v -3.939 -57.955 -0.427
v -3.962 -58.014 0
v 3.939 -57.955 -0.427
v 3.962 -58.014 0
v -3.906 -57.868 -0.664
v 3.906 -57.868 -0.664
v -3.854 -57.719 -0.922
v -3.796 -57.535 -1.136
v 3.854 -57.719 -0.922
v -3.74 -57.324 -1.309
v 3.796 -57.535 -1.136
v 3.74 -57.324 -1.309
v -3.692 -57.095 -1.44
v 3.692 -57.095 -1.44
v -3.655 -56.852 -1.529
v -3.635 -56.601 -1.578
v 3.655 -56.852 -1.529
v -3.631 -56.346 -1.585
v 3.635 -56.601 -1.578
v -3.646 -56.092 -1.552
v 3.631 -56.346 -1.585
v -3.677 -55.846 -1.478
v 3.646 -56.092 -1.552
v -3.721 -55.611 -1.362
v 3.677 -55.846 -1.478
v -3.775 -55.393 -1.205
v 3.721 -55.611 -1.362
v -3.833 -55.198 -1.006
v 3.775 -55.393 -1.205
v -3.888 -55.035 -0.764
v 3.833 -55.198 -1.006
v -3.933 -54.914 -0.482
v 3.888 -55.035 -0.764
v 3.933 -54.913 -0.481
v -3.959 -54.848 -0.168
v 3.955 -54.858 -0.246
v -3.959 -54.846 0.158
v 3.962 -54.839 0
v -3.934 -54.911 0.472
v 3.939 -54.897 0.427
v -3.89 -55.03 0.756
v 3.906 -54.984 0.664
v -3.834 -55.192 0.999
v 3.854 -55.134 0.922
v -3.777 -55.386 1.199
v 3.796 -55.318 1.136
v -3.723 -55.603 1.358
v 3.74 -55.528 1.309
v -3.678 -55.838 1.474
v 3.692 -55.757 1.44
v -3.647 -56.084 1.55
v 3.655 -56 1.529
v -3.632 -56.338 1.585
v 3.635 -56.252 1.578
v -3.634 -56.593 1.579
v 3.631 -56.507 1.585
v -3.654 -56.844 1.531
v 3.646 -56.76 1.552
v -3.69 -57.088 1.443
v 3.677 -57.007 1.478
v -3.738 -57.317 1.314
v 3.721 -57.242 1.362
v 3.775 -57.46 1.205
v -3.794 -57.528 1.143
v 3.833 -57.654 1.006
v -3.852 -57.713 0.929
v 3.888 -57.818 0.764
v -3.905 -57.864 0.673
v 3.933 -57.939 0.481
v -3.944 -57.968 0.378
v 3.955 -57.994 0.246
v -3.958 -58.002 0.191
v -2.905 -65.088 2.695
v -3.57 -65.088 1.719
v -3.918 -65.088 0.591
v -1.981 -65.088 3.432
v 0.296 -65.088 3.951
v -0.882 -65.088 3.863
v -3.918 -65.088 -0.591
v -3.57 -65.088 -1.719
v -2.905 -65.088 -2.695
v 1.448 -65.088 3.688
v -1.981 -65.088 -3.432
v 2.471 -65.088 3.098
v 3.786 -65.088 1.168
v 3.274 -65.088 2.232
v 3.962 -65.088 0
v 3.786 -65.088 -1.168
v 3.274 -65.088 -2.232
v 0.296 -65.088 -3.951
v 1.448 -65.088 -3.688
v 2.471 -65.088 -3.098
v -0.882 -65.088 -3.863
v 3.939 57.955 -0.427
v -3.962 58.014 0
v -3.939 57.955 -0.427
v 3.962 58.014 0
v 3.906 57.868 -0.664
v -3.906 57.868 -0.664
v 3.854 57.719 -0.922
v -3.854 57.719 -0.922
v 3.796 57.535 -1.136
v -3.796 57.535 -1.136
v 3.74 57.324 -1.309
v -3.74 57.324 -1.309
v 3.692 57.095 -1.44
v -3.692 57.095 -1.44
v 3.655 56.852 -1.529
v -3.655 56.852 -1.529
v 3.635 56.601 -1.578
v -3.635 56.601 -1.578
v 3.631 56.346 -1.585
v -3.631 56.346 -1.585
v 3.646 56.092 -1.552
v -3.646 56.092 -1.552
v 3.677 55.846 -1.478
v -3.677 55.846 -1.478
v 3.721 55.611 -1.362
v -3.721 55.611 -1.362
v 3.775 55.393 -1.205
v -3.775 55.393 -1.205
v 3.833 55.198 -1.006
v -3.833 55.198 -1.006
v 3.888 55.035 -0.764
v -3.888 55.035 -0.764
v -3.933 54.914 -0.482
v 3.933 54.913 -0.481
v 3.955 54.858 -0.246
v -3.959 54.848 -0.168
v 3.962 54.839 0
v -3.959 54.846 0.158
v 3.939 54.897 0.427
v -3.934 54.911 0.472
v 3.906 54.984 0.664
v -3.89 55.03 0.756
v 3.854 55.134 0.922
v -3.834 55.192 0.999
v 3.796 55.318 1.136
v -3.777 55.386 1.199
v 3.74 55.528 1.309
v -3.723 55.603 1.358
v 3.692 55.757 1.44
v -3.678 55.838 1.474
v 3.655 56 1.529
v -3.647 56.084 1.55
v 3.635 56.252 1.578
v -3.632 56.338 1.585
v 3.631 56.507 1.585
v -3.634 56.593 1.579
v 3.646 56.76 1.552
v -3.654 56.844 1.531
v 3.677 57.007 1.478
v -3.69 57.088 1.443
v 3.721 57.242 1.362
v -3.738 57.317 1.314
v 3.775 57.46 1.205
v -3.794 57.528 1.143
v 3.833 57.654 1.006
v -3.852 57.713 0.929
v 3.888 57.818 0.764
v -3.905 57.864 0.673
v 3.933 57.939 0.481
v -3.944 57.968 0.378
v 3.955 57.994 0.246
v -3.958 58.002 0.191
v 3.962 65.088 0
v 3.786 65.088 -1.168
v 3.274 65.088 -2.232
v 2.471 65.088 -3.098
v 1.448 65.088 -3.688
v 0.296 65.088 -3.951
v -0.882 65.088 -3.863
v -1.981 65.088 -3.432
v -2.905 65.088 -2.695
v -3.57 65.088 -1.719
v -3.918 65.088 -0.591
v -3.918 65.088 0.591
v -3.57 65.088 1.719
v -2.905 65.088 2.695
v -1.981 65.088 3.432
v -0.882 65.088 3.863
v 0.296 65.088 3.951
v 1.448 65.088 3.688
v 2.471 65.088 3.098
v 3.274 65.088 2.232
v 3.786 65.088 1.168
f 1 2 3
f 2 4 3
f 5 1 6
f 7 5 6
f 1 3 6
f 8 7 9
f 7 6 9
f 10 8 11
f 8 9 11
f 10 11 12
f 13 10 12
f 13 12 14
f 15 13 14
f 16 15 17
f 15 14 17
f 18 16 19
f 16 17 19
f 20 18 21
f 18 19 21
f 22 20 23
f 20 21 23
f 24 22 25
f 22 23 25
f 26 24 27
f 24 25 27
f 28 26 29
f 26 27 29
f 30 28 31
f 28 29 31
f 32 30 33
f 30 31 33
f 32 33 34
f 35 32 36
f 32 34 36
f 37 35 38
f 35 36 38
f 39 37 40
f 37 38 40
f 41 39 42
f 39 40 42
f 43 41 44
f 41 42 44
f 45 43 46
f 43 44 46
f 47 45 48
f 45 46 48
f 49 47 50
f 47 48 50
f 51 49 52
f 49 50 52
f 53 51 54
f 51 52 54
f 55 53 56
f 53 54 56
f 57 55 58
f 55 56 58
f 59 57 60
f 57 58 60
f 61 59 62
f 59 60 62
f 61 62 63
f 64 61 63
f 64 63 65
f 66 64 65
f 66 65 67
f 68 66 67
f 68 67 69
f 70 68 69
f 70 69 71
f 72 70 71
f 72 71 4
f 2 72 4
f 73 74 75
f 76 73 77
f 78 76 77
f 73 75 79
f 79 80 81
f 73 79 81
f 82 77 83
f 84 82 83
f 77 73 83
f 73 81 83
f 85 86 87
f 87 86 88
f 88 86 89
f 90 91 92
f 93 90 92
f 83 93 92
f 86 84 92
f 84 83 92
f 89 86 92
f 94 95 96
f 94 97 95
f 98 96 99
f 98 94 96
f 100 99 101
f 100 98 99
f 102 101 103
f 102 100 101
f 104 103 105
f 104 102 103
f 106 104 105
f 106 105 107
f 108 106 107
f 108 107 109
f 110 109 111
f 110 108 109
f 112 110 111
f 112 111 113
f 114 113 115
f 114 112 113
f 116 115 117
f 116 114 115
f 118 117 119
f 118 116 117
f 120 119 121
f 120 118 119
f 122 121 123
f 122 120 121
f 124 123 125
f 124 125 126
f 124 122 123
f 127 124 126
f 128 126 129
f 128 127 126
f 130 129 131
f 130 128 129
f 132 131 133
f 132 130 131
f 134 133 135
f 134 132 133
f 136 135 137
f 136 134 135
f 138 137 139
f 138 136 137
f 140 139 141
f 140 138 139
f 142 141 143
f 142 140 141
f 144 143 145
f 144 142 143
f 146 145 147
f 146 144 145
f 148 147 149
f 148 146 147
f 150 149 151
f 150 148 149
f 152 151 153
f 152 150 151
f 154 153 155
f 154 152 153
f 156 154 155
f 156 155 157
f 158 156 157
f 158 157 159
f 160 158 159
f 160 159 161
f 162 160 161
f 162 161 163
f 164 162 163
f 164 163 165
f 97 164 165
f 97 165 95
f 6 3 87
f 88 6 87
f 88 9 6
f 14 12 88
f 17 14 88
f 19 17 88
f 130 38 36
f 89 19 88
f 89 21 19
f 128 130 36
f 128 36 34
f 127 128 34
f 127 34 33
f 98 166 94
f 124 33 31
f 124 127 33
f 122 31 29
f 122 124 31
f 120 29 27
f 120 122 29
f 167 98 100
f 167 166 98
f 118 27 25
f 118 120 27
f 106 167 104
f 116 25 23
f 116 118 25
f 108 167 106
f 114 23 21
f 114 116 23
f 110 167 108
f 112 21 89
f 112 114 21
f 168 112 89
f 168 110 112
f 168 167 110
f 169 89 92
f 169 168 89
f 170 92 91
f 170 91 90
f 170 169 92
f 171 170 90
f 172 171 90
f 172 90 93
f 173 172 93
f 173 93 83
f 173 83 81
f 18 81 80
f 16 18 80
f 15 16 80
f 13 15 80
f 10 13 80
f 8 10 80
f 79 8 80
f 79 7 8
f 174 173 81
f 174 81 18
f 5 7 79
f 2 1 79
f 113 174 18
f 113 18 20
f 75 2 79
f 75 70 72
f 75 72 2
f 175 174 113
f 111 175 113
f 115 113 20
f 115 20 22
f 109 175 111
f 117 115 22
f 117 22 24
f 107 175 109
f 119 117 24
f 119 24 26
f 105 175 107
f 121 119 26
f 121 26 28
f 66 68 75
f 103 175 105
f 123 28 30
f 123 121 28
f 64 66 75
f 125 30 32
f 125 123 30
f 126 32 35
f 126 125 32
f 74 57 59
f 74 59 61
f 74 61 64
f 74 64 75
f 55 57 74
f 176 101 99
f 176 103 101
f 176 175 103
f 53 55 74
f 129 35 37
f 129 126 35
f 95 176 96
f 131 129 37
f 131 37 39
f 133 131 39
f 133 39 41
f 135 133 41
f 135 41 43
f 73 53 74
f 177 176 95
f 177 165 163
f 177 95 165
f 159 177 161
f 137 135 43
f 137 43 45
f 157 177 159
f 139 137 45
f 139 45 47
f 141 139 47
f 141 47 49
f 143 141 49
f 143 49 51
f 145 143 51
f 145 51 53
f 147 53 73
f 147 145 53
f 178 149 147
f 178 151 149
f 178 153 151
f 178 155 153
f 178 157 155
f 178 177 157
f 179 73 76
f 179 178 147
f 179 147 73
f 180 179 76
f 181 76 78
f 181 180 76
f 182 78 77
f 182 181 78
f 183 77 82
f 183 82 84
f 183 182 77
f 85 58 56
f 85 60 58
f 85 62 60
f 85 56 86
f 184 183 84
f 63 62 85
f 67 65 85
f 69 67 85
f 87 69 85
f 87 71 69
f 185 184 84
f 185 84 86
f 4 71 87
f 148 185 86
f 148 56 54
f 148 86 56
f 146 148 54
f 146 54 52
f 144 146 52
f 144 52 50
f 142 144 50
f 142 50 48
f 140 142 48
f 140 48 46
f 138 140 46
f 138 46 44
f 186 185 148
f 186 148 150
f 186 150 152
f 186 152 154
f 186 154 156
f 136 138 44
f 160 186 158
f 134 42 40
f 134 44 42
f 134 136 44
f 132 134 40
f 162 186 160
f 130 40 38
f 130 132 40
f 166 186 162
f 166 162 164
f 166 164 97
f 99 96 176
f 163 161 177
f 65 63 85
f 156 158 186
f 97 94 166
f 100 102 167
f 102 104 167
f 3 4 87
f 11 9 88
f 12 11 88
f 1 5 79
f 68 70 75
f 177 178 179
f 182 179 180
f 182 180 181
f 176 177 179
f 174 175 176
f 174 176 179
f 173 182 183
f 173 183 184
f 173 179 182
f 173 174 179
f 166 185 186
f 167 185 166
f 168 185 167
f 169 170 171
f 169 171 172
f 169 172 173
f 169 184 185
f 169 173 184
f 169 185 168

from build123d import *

# Parameters (mm, degrees)
SKETCH1_R           = 3.9624
BOSS_EXTRUDE1_DEPTH = 65.0875
SKETCH2_W           = 32.020580586
SKETCH2_H           = 1.5875


with BuildPart() as part:
    # Sketch1 → Boss-Extrude1 (new body, symmetric)
    with BuildSketch(Plane(origin=(0, 0, 0), x_dir=(1, 0, 0), z_dir=(0, 1, 0))):
        Circle(SKETCH1_R)
    extrude(amount=BOSS_EXTRUDE1_DEPTH, both=True)

    # Sketch2 → Cut-Revolve1 (revolve, cut)
    with BuildSketch(Plane.XY):
        with Locations((-1.023553281, 57.21985)):
            Rectangle(SKETCH2_W, SKETCH2_H)
    cut_revolve1 = revolve(axis=Axis((14.986737012, 56.4261, 0), (-1, 0, 0)), mode=Mode.SUBTRACT)

    # Mirror1: Cut-Revolve1 across plane
    add(cut_revolve1.mirror(Plane.ZX), mode=Mode.SUBTRACT)


solid = part.part
